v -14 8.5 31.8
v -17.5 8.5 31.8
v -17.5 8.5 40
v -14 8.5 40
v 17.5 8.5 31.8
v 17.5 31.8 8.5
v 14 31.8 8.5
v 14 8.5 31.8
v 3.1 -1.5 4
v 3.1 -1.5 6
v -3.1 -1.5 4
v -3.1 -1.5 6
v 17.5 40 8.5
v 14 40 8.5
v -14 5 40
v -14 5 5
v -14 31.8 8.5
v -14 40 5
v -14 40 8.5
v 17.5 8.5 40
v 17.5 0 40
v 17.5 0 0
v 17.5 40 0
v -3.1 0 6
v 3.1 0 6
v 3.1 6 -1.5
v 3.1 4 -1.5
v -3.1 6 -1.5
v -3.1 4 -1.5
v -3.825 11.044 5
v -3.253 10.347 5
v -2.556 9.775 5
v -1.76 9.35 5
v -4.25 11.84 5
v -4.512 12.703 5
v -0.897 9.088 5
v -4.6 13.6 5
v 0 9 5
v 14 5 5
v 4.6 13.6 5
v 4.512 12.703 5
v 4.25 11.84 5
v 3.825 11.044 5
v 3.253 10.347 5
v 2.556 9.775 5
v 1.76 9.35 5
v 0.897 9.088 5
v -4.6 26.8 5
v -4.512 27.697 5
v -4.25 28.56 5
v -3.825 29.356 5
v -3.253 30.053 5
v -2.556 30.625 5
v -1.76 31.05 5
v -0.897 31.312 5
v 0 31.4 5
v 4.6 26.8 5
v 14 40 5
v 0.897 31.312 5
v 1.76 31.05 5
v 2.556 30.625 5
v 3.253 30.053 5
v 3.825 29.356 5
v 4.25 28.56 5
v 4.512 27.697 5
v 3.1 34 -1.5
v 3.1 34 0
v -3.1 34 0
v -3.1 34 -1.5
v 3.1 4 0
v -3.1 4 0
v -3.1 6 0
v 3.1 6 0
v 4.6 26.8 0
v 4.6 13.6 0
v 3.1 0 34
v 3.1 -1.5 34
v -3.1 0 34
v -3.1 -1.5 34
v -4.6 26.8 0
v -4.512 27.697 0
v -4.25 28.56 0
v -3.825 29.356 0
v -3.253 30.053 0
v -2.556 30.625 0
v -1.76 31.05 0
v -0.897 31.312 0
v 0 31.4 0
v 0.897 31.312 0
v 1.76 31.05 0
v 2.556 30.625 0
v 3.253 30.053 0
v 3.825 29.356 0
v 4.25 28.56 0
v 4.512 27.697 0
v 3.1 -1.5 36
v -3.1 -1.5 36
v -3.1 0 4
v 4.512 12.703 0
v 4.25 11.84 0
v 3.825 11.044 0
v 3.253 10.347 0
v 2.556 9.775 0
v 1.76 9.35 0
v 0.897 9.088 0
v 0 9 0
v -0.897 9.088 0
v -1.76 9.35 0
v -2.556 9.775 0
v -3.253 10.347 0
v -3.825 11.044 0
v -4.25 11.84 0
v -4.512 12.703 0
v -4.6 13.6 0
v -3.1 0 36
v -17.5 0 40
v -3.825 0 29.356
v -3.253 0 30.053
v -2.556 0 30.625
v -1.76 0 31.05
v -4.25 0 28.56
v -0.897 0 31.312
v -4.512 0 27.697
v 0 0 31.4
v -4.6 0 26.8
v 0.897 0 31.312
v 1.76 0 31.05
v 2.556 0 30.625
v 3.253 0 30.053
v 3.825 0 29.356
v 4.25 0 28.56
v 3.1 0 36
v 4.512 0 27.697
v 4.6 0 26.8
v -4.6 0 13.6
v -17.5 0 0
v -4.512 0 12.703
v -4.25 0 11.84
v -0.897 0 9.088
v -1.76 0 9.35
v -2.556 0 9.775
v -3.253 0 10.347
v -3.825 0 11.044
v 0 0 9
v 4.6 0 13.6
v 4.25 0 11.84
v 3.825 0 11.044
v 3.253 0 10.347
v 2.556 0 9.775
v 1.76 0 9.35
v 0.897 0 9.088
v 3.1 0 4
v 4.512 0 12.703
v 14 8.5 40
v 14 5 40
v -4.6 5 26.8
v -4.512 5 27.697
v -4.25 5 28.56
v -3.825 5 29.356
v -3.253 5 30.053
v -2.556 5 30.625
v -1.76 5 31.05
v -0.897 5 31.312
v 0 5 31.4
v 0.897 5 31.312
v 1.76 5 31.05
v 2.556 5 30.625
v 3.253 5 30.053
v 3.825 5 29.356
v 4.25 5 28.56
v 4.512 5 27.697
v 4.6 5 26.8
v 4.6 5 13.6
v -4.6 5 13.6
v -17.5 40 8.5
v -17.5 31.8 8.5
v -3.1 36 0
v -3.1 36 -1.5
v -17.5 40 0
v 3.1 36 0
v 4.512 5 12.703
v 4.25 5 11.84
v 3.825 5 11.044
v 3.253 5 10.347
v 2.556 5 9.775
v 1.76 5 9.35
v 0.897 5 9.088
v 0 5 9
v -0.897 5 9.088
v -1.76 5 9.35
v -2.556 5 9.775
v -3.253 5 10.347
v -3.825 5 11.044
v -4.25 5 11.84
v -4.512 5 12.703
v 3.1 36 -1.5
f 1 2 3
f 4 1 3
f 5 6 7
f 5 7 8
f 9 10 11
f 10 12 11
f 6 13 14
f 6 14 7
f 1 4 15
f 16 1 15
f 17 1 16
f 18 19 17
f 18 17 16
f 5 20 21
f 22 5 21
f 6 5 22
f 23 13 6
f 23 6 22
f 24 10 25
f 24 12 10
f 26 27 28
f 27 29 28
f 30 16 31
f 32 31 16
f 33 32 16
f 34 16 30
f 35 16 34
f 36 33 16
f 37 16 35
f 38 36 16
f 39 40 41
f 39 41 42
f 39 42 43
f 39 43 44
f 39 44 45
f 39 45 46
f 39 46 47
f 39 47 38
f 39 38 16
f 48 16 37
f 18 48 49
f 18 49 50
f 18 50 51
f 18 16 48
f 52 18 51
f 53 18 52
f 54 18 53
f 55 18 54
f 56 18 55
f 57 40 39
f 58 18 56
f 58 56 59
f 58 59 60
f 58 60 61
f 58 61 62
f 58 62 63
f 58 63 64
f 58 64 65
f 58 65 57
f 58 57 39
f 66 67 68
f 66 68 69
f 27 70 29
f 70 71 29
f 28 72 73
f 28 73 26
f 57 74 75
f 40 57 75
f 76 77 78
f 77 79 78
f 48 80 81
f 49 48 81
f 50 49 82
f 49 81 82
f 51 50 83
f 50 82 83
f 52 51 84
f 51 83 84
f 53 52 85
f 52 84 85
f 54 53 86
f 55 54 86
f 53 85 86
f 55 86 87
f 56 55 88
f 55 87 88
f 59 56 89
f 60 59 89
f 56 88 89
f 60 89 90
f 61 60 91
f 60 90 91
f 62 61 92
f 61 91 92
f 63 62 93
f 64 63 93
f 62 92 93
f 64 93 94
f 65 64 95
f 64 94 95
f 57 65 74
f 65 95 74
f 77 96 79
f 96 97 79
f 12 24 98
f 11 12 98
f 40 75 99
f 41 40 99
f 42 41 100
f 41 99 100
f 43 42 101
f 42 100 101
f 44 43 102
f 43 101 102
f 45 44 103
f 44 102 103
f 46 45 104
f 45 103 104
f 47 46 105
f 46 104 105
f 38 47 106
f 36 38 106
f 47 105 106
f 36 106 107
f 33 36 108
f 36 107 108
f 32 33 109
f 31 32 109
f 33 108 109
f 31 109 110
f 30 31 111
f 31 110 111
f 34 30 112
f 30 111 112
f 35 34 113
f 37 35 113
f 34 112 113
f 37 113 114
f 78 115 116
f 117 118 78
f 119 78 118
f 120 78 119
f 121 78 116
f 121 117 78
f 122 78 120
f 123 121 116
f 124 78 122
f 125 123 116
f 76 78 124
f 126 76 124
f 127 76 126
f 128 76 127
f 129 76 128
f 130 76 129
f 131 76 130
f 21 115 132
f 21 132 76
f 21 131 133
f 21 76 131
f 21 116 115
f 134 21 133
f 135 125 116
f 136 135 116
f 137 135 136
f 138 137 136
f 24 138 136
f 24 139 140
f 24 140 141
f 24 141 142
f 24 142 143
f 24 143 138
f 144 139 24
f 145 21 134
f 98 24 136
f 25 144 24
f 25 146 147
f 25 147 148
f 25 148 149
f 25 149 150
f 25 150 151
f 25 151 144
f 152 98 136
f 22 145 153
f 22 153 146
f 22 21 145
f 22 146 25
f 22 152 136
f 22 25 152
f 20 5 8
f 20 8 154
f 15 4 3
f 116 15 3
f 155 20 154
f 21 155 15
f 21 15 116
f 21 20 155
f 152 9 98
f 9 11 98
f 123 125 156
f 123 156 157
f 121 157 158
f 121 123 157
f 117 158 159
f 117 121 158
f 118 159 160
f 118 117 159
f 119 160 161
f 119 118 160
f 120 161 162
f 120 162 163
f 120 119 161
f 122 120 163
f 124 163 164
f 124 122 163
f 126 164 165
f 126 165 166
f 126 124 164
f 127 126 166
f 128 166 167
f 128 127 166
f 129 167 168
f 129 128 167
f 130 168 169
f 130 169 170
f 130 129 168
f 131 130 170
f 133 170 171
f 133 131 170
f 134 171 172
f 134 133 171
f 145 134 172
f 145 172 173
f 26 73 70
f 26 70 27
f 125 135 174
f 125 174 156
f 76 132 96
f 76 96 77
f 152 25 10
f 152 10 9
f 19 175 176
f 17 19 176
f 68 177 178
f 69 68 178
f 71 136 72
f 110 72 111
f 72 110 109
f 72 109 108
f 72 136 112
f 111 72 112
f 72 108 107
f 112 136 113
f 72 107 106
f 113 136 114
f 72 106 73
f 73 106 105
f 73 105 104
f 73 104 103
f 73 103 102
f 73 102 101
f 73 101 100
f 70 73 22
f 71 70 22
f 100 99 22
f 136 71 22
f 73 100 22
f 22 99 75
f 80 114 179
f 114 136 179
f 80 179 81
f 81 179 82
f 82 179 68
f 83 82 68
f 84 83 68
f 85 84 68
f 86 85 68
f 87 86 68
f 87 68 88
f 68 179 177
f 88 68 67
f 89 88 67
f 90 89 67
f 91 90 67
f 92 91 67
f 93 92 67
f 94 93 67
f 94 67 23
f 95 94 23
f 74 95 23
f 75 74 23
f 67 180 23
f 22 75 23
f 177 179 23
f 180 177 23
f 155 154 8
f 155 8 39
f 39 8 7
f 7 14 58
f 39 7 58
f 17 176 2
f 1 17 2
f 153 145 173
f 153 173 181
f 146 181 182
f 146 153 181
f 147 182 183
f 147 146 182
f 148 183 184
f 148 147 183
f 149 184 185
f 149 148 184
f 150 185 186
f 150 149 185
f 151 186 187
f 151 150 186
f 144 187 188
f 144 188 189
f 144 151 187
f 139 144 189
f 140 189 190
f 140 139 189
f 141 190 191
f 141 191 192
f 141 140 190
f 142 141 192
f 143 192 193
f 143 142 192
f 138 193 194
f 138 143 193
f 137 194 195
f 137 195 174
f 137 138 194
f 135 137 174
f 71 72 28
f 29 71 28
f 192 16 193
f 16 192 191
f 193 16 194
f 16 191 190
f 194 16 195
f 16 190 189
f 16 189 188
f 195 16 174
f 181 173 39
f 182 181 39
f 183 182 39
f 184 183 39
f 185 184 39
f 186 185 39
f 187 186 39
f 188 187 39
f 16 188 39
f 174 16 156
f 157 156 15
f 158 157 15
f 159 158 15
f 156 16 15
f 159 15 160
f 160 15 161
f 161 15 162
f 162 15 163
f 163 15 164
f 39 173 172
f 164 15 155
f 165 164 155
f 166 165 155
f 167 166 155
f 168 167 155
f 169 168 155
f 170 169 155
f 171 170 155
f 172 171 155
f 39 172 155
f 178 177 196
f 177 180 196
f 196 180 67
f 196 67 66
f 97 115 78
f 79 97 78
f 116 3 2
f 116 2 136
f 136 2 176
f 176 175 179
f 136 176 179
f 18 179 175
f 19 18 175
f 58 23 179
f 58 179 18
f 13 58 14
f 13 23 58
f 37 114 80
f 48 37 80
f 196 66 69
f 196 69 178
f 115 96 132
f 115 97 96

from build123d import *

# Parameters (mm, degrees)
SKETCH_3_W      = 35
SKETCH_3_H      = 40
EXTRUDE_1_DEPTH = 5
EXTRUDE_2_DEPTH = 3.5
SKETCH_5_W      = 35
SKETCH_5_H      = 40
EXTRUDE_3_DEPTH = 5
SKETCH_6_W      = 2
SKETCH_6_H      = 1.5
SKETCH_6_W_2    = 1.5
SKETCH_6_H_2    = 2
EXTRUDE_4_DEPTH = 3.1


with BuildPart() as part:
    # 草图3 → 凸台-拉伸1 (new body)
    with BuildSketch(Plane.XY):
        with Locations((0, 20)):
            Rectangle(SKETCH_3_W, SKETCH_3_H)
        with BuildLine():
            Line((4.6, 26.8), (4.6, 13.6))
            ThreePointArc((4.6, 13.6), (0, 9), (-4.6, 13.6))
            Line((-4.6, 13.6), (-4.6, 26.8))
            ThreePointArc((-4.6, 26.8), (0, 31.4), (4.6, 26.8))
        make_face(mode=Mode.SUBTRACT)
    extrude(amount=EXTRUDE_1_DEPTH)

    # 草图4 → 凸台-拉伸2 (add)
    with BuildSketch(Plane.ZY.offset(17.5)):
        Polygon((5, 40), (8.5, 40), (8.5, 31.8), (31.8, 8.5), (40, 8.5), (40, 0), (5, 0), align=None)
    extrude_2 = extrude(amount=-EXTRUDE_2_DEPTH)

    # 镜向1: 凸台-拉伸2 across plane
    add(extrude_2.mirror(Plane(origin=(0, 0, 0), x_dir=(0, 0, 1), z_dir=(1, 0, 0))))

    # 草图5 → 凸台-拉伸3 (add)
    with BuildSketch(Plane.XZ):
        with Locations((0, 20)):
            Rectangle(SKETCH_5_W, SKETCH_5_H)
        with BuildLine():
            Line((4.6, 26.8), (4.6, 13.6))
            ThreePointArc((4.6, 13.6), (0, 9), (-4.6, 13.6))
            Line((-4.6, 13.6), (-4.6, 26.8))
            ThreePointArc((-4.6, 26.8), (0, 31.4), (4.6, 26.8))
        make_face(mode=Mode.SUBTRACT)
    extrude(amount=-EXTRUDE_3_DEPTH)

    # 草图6 → 凸台-拉伸4 (add, symmetric)
    with BuildSketch(Plane(origin=(0, 0, 0), x_dir=(0, 0, -1), z_dir=(1, 0, 0))):
        with Locations((-35, -0.75)):
            Rectangle(SKETCH_6_W, SKETCH_6_H)
        with Locations((-5, -0.75)):
            Rectangle(SKETCH_6_W, SKETCH_6_H)
        with Locations((0.75, 5)):
            Rectangle(SKETCH_6_W_2, SKETCH_6_H_2)
        with Locations((0.75, 35)):
            Rectangle(SKETCH_6_W_2, SKETCH_6_H_2)
    extrude(amount=EXTRUDE_4_DEPTH, both=True)


solid = part.part
